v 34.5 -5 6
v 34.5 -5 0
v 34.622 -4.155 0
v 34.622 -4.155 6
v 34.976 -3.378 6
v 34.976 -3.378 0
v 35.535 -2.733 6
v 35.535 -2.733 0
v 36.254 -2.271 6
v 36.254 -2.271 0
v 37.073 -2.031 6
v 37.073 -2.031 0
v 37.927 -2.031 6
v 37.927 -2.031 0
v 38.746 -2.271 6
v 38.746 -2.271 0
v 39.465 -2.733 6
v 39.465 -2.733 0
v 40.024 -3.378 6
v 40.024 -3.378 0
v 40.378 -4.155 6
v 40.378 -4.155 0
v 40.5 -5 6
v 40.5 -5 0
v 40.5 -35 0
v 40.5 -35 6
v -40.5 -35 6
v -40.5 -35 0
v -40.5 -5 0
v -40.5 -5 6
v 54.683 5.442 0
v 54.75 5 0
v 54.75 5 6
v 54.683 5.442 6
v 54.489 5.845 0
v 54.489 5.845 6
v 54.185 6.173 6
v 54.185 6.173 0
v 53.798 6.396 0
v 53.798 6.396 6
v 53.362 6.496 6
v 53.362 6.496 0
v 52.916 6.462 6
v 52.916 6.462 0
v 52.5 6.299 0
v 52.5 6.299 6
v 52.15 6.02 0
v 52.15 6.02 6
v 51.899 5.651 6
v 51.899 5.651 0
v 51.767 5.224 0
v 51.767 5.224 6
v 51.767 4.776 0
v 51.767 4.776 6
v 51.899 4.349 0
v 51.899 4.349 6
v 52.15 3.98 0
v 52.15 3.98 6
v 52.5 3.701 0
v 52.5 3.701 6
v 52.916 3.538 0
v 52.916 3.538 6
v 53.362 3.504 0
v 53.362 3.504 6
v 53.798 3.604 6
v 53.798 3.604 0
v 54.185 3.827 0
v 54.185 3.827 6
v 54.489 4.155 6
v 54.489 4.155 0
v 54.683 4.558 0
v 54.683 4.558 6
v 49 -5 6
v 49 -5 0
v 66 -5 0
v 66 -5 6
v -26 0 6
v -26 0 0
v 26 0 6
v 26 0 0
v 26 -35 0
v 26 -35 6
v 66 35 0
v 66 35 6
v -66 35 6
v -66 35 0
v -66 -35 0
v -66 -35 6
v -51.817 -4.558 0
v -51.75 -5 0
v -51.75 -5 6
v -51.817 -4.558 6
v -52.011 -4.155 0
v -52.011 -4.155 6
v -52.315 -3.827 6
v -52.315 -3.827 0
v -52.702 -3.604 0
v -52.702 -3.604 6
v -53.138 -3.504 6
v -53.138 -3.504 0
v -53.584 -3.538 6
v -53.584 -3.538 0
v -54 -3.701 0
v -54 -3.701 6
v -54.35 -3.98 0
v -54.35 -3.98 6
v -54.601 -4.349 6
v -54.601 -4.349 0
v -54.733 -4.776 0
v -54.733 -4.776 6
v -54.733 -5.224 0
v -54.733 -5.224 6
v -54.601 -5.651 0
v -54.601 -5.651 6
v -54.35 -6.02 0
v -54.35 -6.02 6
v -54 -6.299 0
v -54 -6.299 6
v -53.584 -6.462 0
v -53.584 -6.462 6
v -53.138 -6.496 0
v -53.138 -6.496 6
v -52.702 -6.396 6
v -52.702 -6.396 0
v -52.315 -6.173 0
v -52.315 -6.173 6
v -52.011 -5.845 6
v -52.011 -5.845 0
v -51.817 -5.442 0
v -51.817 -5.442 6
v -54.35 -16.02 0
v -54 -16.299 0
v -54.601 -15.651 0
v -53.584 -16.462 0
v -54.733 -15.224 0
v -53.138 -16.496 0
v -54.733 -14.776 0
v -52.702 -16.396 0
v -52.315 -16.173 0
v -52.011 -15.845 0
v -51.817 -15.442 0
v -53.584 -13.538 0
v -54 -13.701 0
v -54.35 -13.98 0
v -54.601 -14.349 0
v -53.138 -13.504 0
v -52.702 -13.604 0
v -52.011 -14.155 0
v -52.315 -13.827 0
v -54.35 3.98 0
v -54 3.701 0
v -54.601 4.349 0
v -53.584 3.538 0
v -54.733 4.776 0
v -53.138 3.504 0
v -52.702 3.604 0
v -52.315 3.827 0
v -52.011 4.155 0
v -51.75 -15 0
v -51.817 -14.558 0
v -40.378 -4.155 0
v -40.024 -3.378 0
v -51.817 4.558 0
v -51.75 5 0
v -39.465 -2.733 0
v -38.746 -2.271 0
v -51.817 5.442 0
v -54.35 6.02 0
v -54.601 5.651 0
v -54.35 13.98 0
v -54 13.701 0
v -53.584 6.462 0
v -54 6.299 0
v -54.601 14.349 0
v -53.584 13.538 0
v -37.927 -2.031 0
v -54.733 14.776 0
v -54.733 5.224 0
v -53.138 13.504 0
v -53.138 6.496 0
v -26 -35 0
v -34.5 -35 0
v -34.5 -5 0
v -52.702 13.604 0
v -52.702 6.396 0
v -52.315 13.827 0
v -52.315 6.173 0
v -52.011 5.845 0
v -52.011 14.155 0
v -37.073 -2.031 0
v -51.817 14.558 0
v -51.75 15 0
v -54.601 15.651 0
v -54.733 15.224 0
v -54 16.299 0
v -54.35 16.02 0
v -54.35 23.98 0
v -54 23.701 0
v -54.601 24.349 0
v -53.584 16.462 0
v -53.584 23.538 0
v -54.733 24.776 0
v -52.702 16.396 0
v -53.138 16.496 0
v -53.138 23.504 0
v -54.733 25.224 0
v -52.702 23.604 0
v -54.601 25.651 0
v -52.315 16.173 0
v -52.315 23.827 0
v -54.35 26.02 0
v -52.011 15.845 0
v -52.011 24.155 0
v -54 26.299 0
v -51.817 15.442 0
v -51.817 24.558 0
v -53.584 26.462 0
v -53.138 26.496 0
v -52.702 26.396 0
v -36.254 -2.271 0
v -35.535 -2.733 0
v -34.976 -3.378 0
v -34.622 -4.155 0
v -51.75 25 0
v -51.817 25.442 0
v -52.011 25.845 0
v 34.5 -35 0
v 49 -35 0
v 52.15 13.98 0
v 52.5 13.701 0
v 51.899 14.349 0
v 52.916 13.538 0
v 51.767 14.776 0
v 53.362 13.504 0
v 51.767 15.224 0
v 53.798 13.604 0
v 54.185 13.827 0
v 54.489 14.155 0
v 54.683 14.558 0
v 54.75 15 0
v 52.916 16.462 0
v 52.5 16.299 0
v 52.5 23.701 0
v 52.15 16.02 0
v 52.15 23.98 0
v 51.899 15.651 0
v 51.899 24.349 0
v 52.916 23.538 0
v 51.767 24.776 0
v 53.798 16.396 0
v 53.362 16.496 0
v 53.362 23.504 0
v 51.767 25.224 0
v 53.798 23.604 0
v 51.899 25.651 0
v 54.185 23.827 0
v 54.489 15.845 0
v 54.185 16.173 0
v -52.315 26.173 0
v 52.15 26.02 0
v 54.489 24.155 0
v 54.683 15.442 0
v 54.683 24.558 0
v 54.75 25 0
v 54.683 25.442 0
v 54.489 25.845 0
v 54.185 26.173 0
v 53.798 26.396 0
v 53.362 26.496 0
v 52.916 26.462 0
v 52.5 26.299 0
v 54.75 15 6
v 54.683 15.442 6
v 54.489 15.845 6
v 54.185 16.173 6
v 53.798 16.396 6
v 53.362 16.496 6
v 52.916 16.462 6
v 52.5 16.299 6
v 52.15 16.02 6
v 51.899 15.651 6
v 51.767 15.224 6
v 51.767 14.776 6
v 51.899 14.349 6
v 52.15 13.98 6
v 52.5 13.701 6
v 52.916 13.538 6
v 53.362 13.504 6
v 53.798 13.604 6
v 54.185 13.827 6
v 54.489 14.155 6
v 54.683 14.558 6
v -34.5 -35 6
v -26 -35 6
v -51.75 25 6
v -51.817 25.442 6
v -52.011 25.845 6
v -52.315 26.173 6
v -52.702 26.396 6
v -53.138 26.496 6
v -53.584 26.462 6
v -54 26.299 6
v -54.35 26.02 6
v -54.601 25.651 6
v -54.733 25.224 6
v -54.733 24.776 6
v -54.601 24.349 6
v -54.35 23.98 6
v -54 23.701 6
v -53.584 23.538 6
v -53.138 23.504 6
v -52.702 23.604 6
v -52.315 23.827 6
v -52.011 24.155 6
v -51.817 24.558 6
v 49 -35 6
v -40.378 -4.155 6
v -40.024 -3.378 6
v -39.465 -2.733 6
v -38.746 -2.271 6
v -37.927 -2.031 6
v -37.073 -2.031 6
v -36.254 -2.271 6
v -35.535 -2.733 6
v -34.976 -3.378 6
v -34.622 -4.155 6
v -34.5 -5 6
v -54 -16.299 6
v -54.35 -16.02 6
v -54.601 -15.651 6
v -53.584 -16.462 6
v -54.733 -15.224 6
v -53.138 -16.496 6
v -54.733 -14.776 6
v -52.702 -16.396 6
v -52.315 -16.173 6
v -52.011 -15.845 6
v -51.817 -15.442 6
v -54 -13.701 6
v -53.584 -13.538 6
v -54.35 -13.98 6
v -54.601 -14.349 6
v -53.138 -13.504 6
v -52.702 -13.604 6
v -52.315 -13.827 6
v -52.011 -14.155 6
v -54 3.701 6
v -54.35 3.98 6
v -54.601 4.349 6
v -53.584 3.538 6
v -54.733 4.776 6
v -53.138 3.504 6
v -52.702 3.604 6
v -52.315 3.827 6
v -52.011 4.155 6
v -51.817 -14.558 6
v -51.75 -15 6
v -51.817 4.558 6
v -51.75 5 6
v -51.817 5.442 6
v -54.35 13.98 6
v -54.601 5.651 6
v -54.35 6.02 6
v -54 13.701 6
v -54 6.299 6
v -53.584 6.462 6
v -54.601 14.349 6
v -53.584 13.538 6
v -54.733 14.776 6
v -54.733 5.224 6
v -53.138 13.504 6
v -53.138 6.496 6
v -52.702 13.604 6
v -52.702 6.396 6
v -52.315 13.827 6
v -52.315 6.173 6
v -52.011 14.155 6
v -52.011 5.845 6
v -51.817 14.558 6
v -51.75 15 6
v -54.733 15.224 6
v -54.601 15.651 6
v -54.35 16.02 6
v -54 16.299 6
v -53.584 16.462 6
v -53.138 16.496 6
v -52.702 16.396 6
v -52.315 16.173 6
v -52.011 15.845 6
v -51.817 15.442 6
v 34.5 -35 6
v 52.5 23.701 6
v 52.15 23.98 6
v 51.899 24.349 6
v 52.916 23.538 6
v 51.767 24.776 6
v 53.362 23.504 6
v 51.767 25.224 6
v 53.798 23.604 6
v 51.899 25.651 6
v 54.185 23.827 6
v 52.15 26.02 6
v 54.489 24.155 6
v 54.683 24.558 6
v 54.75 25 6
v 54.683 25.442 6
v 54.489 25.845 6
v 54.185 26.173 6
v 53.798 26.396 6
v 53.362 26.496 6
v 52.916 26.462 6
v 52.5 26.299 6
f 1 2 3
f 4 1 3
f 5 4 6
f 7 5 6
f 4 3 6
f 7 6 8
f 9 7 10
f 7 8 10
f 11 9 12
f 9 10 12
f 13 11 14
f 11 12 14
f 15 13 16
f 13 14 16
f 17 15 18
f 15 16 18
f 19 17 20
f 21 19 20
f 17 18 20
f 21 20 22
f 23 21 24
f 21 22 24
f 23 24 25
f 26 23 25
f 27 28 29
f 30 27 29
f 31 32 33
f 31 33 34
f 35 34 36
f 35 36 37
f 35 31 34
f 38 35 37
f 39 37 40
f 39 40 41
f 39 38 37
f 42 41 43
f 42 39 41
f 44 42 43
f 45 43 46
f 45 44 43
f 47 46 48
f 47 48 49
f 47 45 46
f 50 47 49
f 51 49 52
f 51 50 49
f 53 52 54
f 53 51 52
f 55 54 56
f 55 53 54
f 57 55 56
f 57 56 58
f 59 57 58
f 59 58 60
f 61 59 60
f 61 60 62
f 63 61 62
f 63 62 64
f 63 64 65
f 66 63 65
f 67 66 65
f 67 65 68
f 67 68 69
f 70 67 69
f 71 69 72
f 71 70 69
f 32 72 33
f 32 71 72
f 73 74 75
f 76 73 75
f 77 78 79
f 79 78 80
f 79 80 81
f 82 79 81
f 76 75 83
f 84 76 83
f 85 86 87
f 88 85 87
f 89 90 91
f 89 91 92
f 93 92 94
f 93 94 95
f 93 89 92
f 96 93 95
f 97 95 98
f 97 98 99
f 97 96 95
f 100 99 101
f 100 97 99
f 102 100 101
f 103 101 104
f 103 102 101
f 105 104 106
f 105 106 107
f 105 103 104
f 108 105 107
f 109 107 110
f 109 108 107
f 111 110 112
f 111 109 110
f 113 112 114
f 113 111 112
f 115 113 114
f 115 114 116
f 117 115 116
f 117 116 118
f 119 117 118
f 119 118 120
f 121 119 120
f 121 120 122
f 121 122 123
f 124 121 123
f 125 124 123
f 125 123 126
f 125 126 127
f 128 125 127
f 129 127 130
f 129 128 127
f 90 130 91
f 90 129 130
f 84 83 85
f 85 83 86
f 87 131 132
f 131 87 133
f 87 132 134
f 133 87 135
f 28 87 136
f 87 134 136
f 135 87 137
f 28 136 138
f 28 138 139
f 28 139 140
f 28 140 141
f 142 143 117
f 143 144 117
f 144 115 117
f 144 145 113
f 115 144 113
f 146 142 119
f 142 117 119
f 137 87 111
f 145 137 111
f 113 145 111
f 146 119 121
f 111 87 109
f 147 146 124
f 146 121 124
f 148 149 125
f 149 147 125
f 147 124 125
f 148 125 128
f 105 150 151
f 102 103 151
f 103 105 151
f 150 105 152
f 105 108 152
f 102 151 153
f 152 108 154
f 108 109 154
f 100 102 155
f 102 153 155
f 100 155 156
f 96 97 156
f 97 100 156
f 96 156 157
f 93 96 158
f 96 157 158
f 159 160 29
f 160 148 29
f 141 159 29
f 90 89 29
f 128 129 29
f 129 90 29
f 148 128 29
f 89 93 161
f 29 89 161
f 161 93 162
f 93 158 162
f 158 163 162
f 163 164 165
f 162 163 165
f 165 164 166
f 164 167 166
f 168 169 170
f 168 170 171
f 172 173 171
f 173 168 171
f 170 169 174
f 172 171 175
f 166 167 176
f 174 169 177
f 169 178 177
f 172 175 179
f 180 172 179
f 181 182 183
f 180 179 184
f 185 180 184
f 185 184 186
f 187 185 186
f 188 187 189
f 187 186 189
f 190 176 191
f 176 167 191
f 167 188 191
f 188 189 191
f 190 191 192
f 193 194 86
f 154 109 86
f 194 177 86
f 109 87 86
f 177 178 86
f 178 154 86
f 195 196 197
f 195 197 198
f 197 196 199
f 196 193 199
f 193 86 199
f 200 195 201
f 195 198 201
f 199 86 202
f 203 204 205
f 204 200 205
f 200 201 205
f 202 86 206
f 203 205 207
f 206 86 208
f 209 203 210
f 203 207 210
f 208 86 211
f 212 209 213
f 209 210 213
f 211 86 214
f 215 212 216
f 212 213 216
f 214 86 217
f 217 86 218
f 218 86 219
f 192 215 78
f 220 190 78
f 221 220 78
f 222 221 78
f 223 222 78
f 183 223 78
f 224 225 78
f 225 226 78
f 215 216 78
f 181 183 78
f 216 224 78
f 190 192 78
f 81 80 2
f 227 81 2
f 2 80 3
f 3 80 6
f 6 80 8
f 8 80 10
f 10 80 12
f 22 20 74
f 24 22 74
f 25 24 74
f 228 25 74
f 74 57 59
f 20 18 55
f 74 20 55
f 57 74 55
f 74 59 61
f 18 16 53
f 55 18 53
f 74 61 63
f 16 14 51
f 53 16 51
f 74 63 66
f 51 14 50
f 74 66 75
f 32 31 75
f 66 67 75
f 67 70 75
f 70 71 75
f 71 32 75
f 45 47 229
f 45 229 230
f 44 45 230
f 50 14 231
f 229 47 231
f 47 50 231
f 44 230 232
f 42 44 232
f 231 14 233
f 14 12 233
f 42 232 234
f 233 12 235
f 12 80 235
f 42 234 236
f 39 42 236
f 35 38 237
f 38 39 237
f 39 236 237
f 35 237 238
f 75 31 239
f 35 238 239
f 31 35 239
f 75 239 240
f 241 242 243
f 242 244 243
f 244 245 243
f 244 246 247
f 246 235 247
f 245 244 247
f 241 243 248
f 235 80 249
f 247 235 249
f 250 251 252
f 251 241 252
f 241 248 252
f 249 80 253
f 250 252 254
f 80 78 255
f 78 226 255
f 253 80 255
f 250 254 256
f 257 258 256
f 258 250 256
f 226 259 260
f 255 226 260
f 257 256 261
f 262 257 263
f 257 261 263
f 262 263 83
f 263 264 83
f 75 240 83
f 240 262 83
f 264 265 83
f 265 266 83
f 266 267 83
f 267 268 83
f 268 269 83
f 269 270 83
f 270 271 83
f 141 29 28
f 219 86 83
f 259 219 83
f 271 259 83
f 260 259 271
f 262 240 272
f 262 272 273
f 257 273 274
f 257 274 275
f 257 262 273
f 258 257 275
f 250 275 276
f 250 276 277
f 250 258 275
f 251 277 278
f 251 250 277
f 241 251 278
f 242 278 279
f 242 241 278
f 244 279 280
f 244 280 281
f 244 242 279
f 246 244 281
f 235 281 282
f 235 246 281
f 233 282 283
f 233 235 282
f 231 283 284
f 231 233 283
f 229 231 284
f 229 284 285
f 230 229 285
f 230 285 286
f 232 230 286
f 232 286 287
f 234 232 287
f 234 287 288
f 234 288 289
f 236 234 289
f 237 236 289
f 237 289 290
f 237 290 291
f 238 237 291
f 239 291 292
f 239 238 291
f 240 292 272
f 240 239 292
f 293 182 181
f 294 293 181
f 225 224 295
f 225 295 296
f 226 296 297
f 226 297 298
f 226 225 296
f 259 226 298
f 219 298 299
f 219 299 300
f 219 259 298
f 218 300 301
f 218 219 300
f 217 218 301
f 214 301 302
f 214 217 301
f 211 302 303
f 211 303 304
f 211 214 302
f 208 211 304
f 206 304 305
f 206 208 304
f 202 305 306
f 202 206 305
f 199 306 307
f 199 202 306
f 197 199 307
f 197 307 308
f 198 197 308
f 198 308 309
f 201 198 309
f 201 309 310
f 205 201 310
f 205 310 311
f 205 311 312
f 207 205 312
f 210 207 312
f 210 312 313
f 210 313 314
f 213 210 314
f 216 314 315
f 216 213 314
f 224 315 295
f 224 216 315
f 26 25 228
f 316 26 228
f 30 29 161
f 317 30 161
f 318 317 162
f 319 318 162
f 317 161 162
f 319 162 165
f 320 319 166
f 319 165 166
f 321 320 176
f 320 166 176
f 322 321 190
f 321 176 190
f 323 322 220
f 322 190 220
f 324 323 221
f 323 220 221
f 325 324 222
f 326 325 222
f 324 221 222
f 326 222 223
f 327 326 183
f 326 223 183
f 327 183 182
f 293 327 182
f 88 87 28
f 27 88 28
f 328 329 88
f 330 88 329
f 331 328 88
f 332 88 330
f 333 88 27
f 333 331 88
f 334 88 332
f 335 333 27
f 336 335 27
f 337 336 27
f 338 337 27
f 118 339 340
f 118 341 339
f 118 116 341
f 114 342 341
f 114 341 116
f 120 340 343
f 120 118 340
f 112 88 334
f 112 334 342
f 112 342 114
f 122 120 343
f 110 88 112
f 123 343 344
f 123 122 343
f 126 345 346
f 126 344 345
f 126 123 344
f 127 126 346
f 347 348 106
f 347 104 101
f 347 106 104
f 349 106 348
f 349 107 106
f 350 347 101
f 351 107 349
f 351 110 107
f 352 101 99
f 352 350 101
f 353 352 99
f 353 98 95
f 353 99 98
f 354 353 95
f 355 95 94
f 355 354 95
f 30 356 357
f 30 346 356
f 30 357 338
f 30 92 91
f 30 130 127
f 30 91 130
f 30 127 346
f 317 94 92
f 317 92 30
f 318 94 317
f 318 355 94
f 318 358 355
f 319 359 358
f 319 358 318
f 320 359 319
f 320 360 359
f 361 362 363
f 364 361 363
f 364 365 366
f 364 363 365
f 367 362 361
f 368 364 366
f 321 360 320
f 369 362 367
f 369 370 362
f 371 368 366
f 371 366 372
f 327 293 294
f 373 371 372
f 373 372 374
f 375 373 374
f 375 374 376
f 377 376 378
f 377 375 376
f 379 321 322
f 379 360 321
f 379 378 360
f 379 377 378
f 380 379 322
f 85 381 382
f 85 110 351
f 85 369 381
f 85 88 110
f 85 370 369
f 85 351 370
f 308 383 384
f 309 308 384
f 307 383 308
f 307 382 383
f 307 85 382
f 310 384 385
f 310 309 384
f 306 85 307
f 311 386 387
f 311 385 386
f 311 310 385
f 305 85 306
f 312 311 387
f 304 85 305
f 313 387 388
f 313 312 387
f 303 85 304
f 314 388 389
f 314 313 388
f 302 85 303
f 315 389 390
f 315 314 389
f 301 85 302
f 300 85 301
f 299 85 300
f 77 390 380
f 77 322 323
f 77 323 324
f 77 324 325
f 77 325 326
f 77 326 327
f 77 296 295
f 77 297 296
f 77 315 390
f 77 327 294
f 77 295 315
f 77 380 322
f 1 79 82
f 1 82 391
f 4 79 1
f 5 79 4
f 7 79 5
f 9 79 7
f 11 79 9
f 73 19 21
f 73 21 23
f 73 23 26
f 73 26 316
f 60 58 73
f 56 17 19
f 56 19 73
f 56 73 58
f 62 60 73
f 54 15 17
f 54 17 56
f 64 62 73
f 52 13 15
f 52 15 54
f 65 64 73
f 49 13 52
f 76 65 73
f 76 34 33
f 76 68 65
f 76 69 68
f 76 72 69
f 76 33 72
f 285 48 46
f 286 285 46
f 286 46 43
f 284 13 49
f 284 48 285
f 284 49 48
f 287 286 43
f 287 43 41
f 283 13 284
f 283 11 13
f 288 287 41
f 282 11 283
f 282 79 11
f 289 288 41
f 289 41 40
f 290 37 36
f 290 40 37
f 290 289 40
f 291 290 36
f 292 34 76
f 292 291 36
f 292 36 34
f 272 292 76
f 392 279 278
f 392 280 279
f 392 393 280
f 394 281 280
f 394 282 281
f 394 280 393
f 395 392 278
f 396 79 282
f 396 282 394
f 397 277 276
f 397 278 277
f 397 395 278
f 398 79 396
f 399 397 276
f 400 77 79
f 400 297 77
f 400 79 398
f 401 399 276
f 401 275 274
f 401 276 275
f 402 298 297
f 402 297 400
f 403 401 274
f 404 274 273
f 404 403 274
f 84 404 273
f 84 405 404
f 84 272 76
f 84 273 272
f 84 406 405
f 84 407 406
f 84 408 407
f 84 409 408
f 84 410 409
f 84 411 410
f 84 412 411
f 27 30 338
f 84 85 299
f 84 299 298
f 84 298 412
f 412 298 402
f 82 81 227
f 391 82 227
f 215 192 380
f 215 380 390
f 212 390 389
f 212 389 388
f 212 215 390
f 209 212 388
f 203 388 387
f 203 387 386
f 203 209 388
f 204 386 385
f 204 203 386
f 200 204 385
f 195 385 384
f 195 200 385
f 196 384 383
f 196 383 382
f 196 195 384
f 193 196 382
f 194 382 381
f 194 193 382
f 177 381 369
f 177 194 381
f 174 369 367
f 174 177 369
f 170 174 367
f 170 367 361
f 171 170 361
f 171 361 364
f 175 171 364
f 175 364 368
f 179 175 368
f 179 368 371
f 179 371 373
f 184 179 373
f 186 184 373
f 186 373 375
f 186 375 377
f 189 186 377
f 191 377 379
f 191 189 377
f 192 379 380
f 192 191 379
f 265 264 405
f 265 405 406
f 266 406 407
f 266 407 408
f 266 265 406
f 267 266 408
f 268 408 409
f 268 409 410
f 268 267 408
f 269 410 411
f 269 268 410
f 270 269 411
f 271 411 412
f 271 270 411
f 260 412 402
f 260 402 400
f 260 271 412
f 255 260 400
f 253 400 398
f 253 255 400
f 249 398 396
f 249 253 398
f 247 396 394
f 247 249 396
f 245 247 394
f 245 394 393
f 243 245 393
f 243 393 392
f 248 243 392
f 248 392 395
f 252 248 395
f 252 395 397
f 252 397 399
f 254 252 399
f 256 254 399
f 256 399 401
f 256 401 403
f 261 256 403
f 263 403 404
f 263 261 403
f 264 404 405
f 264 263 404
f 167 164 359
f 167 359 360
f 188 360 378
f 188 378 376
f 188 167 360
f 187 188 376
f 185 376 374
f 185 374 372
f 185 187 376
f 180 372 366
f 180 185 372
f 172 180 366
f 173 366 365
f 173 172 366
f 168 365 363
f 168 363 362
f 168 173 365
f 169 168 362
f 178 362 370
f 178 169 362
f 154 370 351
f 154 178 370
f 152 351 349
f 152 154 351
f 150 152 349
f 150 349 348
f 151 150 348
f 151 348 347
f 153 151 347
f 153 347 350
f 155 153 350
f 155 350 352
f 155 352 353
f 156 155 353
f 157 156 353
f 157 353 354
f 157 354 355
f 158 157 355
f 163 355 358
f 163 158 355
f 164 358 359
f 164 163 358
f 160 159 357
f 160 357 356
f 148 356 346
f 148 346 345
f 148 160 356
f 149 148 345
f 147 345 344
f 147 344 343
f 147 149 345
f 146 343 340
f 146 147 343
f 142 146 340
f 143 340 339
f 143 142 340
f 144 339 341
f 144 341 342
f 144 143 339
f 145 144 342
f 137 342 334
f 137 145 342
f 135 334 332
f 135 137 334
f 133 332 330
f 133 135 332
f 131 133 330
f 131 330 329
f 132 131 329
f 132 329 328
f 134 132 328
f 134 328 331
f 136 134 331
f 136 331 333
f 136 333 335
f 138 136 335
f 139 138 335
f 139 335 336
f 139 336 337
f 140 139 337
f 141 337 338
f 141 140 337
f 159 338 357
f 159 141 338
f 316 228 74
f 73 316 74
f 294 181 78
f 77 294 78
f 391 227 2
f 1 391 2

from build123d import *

# Parameters (mm, degrees)
ESBO_O1_R                = 1.5
RESSALTO_EXTRUS_O1_DEPTH = 6


with BuildPart() as part:
    # Esboço1 → Ressalto-extrusão1 (new body)
    with BuildSketch(Plane.XY):
        with BuildLine():
            Line((-66, -35), (-40.5, -35))
            Line((-40.5, -35), (-40.5, -5))
            ThreePointArc((-40.5, -5), (-37.5, -2), (-34.5, -5))
            Line((-34.5, -5), (-34.5, -35))
            Line((-34.5, -35), (-26, -35))
            Line((-26, -35), (-26, 0))
            Line((-26, 0), (26, 0))
            Line((26, 0), (26, -35))
            Line((26, -35), (34.5, -35))
            Line((34.5, -35), (34.5, -5))
            ThreePointArc((34.5, -5), (37.5, -2), (40.5, -5))
            Line((40.5, -5), (40.5, -35))
            Line((40.5, -35), (49, -35))
            Line((49, -35), (49, -5))
            Line((49, -5), (66, -5))
            Line((66, -5), (66, 35))
            Line((66, 35), (-66, 35))
            Line((-66, 35), (-66, -35))
        make_face()
        with Locations((-53.25, -5)):
            Circle(ESBO_O1_R, mode=Mode.SUBTRACT)
        with Locations((-53.25, -15)):
            Circle(ESBO_O1_R, mode=Mode.SUBTRACT)
        with Locations((-53.25, 15)):
            Circle(ESBO_O1_R, mode=Mode.SUBTRACT)
        with Locations((-53.25, 25)):
            Circle(ESBO_O1_R, mode=Mode.SUBTRACT)
        with Locations((-53.25, 5)):
            Circle(ESBO_O1_R, mode=Mode.SUBTRACT)
        with Locations((53.25, 5)):
            Circle(ESBO_O1_R, mode=Mode.SUBTRACT)
        with Locations((53.25, 25)):
            Circle(ESBO_O1_R, mode=Mode.SUBTRACT)
        with Locations((53.25, 15)):
            Circle(ESBO_O1_R, mode=Mode.SUBTRACT)
    extrude(amount=RESSALTO_EXTRUS_O1_DEPTH)


solid = part.part
